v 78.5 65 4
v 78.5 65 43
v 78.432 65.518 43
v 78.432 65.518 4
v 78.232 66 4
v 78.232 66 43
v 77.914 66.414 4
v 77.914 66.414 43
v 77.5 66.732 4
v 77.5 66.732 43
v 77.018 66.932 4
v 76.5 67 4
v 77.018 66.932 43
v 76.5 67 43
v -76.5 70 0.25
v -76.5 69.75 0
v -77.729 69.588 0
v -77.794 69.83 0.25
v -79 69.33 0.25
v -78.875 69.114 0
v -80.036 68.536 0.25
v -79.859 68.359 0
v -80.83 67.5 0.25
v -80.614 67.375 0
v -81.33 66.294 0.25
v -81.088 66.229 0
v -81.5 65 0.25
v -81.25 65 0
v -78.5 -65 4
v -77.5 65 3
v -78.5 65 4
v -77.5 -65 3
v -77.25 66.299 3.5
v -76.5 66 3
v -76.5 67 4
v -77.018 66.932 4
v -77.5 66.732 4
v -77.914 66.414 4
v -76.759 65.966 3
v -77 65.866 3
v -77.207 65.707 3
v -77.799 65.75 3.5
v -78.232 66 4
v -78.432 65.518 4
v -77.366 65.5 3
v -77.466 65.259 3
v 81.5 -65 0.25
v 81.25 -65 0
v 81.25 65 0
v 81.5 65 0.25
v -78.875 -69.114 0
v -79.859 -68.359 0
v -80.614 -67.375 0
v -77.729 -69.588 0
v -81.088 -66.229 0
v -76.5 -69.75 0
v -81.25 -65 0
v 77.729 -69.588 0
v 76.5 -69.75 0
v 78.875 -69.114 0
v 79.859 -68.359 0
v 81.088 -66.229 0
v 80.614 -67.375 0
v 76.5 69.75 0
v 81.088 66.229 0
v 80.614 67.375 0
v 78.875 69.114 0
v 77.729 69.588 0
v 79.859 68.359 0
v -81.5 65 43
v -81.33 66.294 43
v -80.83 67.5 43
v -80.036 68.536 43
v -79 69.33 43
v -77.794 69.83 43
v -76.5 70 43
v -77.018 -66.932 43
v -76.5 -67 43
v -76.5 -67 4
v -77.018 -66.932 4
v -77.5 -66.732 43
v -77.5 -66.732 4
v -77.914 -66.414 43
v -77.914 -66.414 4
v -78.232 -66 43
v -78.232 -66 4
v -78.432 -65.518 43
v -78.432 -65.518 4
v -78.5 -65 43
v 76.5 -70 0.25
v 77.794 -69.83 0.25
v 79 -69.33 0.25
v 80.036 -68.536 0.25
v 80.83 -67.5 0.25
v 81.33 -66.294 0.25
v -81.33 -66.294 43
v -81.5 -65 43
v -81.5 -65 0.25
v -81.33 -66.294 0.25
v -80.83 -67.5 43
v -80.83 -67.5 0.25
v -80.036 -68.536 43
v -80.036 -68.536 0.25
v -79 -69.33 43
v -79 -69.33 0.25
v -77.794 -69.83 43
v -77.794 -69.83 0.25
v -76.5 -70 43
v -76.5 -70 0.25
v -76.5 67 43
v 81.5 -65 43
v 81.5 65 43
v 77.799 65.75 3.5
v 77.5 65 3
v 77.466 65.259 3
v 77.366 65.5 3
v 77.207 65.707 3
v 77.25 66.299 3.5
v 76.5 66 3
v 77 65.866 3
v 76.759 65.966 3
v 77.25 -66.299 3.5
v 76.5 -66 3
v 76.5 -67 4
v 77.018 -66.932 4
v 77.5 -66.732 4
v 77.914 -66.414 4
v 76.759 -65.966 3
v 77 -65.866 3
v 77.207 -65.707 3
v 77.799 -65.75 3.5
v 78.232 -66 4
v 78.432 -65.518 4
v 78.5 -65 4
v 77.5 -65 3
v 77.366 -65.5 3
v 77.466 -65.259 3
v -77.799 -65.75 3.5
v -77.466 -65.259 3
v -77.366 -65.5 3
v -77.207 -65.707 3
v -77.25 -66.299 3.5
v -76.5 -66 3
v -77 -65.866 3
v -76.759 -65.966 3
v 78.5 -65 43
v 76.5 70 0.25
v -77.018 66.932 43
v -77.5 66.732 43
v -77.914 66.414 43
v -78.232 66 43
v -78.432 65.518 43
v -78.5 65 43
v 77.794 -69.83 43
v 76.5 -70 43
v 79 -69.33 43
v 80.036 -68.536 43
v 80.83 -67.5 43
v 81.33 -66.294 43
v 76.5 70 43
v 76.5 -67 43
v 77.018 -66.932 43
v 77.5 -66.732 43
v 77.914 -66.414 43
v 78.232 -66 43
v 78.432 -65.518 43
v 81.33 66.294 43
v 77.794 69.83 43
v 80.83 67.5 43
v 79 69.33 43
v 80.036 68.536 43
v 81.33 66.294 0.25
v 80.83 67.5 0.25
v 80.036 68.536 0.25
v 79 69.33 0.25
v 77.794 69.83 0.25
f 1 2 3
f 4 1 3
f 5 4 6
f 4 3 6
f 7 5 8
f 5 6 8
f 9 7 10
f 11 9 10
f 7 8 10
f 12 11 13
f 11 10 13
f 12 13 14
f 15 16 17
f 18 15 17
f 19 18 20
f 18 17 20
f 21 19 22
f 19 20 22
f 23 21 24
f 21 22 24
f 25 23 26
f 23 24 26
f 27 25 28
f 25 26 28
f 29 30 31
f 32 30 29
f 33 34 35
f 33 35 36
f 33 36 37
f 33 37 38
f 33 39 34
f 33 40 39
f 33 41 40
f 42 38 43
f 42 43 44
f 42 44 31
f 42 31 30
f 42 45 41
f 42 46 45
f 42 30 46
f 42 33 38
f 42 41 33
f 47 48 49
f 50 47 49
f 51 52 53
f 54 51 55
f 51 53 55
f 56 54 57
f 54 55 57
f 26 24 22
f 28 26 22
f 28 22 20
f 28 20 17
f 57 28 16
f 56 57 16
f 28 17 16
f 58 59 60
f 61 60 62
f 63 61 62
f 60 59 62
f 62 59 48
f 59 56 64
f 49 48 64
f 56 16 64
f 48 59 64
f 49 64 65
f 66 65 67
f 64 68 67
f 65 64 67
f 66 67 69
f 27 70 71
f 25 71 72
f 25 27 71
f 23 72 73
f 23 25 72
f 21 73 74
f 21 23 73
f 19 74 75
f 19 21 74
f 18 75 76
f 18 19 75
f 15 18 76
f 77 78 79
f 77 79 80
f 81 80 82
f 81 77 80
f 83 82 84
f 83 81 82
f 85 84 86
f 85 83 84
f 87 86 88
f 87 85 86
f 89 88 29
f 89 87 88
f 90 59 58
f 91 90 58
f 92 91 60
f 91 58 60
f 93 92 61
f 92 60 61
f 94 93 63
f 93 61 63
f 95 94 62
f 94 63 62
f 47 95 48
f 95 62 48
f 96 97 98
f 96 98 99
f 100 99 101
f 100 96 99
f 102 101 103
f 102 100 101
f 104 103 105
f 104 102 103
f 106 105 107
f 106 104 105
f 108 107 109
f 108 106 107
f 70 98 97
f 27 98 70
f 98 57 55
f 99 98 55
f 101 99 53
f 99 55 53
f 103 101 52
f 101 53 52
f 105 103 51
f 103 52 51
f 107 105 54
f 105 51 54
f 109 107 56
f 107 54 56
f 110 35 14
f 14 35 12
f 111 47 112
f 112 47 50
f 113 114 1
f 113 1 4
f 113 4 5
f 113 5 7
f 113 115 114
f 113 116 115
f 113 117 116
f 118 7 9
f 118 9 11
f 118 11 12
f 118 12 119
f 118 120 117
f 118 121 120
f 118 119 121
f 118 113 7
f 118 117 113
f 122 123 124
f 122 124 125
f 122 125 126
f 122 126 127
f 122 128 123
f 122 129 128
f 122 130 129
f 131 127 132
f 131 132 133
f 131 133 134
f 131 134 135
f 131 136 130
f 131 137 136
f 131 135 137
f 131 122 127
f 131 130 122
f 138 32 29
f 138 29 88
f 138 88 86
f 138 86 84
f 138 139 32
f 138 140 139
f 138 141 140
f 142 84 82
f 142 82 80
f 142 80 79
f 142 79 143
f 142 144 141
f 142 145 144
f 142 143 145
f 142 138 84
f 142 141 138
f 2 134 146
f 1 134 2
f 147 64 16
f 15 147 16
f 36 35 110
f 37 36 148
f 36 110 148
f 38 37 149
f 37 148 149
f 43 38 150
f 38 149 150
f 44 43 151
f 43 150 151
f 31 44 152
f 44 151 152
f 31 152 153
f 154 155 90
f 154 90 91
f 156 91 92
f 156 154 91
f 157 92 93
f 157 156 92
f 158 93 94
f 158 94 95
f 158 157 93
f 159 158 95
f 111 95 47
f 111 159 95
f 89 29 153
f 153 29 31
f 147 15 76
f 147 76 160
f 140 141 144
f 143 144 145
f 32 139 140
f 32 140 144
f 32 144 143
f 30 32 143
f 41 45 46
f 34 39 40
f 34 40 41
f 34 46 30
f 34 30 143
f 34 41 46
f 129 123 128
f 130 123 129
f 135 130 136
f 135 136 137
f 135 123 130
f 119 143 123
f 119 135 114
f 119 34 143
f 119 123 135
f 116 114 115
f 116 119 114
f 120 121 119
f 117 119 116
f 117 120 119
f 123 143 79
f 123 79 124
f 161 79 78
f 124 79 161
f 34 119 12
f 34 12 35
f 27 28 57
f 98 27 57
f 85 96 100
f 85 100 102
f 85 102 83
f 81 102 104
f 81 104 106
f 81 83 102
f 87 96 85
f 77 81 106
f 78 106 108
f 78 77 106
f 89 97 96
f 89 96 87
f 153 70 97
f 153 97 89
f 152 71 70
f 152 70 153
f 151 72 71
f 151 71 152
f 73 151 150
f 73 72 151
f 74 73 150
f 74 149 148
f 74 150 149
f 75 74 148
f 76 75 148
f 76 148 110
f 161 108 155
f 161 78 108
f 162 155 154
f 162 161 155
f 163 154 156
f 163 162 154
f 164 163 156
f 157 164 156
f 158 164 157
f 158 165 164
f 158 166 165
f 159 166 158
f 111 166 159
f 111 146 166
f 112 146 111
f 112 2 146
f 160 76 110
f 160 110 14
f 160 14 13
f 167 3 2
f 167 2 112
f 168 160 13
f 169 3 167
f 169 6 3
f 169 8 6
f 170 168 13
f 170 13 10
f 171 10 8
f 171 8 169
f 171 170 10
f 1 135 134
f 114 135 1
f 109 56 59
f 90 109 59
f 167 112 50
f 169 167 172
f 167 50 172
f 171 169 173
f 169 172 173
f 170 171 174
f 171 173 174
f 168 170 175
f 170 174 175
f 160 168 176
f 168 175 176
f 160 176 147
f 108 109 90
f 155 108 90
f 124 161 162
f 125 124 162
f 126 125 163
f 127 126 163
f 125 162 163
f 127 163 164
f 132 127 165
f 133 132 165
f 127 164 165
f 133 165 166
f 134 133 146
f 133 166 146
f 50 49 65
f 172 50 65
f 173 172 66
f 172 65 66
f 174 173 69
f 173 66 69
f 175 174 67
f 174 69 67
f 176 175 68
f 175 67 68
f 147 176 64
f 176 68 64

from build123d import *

# Parameters (mm, degrees)
F0_W     = 163
F0_H     = 140
F0_W_2   = 123
F0_H_2   = 100
F0_W_3   = 115
F0_H_3   = 92
F1_DEPTH = 3
F2_W     = 163
F2_H     = 140
F2_W_2   = 157
F2_H_2   = 134
F3_DEPTH = 40
F4_R     = 5
F5_R     = 2
F6_SIZE  = 0.25
F7_SIZE  = 1


with BuildPart() as f1:
    # F0 (on Top) → F1 (new body)
    with BuildSketch(Plane.XY):
        Rectangle(F0_W, F0_H)
        Rectangle(F0_W_2, F0_H_2, mode=Mode.SUBTRACT)
        Rectangle(F0_W_2, F0_H_2)
        Rectangle(F0_W_3, F0_H_3, mode=Mode.SUBTRACT)
        Rectangle(F0_W_3, F0_H_3)
    extrude(amount=F1_DEPTH)

    # F2 (on face) → F3 (join)
    with BuildSketch(Plane.XY.offset(3)):
        Rectangle(F2_W, F2_H)
        Rectangle(F2_W_2, F2_H_2, mode=Mode.SUBTRACT)
    extrude(amount=F3_DEPTH)

    # F4
    f4_edges = [f1.edges().sort_by_distance(p)[0] for p in [
        (-81.5, -70, 21.5),
        (81.5, -70, 21.5),
        (81.5, 70, 21.5),
        (-81.5, 70, 21.5),
    ]]
    fillet(f4_edges, radius=F4_R)

    # F5
    f5_edges = [f1.edges().sort_by_distance(p)[0] for p in [
        (78.5, -67, 23),
        (-78.5, -67, 23),
        (78.5, 67, 23),
        (-78.5, 67, 23),
    ]]
    fillet(f5_edges, radius=F5_R)

    # F6
    f6_edges = [f1.edges().sort_by_distance(p)[0] for p in [
        (0, -70, 0),
        (-80.035534, -68.535534, 0),
        (80.035534, -68.535534, 0),
        (-81.5, 0, 0),
        (81.5, 0, 0),
        (-80.035534, 68.535534, 0),
        (80.035534, 68.535534, 0),
        (0, 70, 0),
    ]]
    chamfer(f6_edges, length=F6_SIZE)

    # F7
    f7_edges = [f1.edges().sort_by_distance(p)[0] for p in [
        (0, -67, 3),
        (77.914214, -66.414214, 3),
        (-77.914214, -66.414214, 3),
        (78.5, 0, 3),
        (-78.5, 0, 3),
        (77.914214, 66.414214, 3),
        (-77.914214, 66.414214, 3),
        (0, 67, 3),
    ]]
    chamfer(f7_edges, length=F7_SIZE)


solid = f1.part
